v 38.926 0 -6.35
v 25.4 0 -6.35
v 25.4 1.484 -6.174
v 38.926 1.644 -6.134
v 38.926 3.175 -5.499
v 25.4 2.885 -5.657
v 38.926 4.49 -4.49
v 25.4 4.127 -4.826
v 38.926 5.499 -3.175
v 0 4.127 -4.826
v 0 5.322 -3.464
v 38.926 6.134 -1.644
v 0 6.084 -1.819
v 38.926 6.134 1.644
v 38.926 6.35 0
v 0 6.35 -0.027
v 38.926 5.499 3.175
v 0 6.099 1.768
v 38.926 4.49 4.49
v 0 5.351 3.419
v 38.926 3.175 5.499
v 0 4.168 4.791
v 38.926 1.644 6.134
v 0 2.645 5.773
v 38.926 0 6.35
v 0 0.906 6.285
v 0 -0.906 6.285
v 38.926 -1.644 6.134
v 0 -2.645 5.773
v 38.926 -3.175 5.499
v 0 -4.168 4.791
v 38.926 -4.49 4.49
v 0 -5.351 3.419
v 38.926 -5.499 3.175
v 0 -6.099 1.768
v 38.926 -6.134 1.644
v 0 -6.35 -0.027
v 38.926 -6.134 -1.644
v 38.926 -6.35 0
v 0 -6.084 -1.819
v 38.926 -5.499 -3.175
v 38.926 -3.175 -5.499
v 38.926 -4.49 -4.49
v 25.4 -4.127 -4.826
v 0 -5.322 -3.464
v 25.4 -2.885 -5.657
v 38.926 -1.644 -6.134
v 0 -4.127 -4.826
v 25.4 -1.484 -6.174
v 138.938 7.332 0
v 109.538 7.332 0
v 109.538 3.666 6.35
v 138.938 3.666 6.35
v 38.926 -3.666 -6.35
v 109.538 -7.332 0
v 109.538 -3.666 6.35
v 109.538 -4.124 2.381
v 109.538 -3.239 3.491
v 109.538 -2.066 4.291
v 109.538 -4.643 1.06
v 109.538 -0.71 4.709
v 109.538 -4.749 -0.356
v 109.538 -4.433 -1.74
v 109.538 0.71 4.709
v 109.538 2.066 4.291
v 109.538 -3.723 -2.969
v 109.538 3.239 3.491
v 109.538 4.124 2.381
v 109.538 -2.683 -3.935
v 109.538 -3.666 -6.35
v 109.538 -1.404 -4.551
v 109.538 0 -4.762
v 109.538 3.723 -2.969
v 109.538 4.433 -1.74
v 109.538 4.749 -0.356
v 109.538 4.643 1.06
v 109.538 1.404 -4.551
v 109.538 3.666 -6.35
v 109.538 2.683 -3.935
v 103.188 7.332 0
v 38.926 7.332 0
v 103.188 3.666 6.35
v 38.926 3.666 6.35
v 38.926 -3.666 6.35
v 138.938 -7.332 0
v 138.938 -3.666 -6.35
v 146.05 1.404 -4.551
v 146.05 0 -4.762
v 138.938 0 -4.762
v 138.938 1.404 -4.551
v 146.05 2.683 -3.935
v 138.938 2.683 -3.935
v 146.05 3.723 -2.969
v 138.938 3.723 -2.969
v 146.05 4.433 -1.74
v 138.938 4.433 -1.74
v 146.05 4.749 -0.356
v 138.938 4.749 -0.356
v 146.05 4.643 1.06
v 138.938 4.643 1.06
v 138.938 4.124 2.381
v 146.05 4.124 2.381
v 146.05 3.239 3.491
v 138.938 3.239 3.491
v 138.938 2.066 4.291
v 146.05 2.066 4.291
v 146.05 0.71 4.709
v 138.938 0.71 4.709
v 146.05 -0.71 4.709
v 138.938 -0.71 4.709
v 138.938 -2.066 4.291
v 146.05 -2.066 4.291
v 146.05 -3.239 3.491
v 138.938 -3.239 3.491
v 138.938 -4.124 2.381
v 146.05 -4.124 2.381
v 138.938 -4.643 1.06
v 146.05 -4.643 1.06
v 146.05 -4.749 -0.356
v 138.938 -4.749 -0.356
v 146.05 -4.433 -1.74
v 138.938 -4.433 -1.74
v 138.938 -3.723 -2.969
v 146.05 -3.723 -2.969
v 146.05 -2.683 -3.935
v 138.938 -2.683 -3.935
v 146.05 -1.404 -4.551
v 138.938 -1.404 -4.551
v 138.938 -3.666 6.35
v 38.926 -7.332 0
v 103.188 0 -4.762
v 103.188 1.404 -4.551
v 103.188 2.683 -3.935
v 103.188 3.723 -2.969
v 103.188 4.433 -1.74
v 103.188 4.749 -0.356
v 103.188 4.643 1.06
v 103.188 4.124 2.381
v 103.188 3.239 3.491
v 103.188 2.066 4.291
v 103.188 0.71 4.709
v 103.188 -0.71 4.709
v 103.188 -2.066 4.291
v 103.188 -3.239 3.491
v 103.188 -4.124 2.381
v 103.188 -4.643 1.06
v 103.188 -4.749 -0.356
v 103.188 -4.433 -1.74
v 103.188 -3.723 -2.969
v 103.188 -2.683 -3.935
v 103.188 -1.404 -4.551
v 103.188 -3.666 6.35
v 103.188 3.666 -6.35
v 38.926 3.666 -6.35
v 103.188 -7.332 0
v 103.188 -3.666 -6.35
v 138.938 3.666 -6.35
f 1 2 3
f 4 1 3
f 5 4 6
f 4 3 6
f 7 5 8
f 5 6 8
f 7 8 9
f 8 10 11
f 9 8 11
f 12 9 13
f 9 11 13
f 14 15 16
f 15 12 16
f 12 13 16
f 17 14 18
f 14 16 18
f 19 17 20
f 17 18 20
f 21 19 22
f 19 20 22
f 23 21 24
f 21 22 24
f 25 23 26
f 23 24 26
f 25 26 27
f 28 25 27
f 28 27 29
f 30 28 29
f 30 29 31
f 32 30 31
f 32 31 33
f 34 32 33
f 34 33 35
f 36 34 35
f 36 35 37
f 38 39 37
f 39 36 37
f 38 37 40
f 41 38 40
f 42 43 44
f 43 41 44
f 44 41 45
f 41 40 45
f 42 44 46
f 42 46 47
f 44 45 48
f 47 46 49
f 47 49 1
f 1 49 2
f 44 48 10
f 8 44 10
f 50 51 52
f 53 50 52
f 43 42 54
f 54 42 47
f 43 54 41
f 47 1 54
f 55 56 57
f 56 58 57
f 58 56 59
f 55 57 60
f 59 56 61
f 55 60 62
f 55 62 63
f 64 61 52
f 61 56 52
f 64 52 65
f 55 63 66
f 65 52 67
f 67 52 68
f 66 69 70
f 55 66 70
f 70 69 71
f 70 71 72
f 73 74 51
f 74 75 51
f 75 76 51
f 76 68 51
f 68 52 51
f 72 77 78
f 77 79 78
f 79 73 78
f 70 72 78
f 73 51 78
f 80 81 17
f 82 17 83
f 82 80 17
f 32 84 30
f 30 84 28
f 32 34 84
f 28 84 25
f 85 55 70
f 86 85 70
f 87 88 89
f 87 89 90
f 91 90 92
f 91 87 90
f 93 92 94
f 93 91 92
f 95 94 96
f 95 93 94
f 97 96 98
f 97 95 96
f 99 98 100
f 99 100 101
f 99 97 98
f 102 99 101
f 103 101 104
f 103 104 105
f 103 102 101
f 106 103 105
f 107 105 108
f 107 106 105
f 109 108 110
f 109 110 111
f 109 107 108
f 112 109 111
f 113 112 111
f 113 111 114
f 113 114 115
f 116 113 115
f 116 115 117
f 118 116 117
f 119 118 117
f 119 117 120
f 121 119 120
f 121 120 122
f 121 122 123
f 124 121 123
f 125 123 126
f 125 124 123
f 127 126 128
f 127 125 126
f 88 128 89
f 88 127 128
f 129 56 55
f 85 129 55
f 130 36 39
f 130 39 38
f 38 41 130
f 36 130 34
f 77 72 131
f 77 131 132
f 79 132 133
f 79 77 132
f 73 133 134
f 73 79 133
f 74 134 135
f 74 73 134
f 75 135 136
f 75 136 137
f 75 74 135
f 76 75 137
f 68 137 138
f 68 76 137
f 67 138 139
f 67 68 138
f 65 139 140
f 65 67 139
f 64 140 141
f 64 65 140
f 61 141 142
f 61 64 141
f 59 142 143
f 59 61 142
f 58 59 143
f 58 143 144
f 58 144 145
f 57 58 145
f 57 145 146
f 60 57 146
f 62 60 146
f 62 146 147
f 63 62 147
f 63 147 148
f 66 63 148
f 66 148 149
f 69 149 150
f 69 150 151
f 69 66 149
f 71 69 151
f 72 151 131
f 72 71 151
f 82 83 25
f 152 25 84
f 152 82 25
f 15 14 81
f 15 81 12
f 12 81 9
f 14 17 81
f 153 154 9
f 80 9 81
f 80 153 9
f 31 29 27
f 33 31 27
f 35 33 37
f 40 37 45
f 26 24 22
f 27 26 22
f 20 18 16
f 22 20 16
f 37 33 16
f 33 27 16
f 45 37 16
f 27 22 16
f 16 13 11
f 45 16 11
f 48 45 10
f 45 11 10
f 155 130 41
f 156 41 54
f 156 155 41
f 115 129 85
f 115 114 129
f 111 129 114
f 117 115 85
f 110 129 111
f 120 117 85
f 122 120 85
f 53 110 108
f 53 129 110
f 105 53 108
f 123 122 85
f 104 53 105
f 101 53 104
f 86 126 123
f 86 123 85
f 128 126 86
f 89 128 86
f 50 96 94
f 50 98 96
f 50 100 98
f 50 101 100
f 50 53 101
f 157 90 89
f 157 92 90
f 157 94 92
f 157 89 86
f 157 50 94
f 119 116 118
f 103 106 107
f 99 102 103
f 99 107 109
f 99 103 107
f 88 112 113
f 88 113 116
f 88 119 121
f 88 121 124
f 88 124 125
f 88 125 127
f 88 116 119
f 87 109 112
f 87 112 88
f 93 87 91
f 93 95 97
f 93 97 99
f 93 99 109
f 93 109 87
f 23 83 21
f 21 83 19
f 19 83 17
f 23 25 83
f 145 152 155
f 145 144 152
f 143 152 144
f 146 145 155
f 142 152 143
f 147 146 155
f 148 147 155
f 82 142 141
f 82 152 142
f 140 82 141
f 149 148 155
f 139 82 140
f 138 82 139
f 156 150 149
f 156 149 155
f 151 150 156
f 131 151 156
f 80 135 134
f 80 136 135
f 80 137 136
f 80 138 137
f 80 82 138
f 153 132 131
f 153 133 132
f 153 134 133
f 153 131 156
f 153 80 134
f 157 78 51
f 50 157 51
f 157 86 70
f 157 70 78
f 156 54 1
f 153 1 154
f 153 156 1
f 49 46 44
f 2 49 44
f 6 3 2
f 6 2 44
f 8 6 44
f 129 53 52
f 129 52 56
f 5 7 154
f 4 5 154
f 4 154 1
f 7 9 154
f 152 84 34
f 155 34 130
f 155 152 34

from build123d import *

# Parameters (mm, degrees)
SKETCH1_R               = 6.35
BOSS_EXTRUDE1_DEPTH     = 146.05
CUT_EXTRUDE1_DEPTH      = 1
CUT_EXTRUDE1_DEPTH_BACK = 25.4
BOSS_EXTRUDE2_START     = -7.112
BOSS_EXTRUDE2_DEPTH     = 100.0125
SKETCH5_R               = 6.35
SKETCH5_R_2             = 4.7625
CUT_EXTRUDE2_DEPTH      = 7.112
CUT_EXTRUDE3_START      = -36.5125
SKETCH6_R               = 19.82685814
SKETCH6_R_2             = 4.7625
CUT_EXTRUDE3_DEPTH      = 6.35


with BuildPart() as part:
    # Sketch1 → Boss-Extrude1 (new body)
    with BuildSketch(Plane(origin=(0, 0, 0), x_dir=(0, 0, -1), z_dir=(1, 0, 0))):
        Circle(SKETCH1_R)
    extrude(amount=BOSS_EXTRUDE1_DEPTH)

    # Sketch2 → Cut-Extrude1 (cut, two sides)
    with BuildSketch(Plane.ZY) as cut_extrude1_sk:
        Polygon((-4.826, -44.764945263), (-4.826, -4.12701151), (-4.826, 4.12701151), (-4.826, 44.764945263), (-86.101867507, 44.764945263), (-86.101867507, -44.764945263), align=None)
    extrude(amount=CUT_EXTRUDE1_DEPTH, mode=Mode.SUBTRACT)
    extrude(cut_extrude1_sk.sketch, amount=-CUT_EXTRUDE1_DEPTH_BACK, mode=Mode.SUBTRACT)

    # Sketch4 → Boss-Extrude2 (add)
    with BuildSketch(Plane(origin=(146.05, 0, 0), x_dir=(0, 0, -1), z_dir=(1, 0, 0)).offset(BOSS_EXTRUDE2_START)):
        Polygon((6.35, -3.666174209), (6.35, 3.666174209), (0, 7.332348419), (-6.35, 3.666174209), (-6.35, -3.666174209), (0, -7.332348419), align=None)
    extrude(amount=-BOSS_EXTRUDE2_DEPTH)

    # Sketch5 → Cut-Extrude2 (cut)
    with BuildSketch(Plane(origin=(146.05, 0, 0), x_dir=(0, 0, -1), z_dir=(1, 0, 0))):
        Circle(SKETCH5_R)
        Circle(SKETCH5_R_2, mode=Mode.SUBTRACT)
    extrude(amount=-CUT_EXTRUDE2_DEPTH, mode=Mode.SUBTRACT)

    # Sketch6 → Cut-Extrude3 (cut)
    with BuildSketch(Plane(origin=(146.05, 0, 0), x_dir=(0, 0, -1), z_dir=(1, 0, 0)).offset(CUT_EXTRUDE3_START)):
        Circle(SKETCH6_R)
        Circle(SKETCH6_R_2, mode=Mode.SUBTRACT)
    extrude(amount=-CUT_EXTRUDE3_DEPTH, mode=Mode.SUBTRACT)


solid = part.part
